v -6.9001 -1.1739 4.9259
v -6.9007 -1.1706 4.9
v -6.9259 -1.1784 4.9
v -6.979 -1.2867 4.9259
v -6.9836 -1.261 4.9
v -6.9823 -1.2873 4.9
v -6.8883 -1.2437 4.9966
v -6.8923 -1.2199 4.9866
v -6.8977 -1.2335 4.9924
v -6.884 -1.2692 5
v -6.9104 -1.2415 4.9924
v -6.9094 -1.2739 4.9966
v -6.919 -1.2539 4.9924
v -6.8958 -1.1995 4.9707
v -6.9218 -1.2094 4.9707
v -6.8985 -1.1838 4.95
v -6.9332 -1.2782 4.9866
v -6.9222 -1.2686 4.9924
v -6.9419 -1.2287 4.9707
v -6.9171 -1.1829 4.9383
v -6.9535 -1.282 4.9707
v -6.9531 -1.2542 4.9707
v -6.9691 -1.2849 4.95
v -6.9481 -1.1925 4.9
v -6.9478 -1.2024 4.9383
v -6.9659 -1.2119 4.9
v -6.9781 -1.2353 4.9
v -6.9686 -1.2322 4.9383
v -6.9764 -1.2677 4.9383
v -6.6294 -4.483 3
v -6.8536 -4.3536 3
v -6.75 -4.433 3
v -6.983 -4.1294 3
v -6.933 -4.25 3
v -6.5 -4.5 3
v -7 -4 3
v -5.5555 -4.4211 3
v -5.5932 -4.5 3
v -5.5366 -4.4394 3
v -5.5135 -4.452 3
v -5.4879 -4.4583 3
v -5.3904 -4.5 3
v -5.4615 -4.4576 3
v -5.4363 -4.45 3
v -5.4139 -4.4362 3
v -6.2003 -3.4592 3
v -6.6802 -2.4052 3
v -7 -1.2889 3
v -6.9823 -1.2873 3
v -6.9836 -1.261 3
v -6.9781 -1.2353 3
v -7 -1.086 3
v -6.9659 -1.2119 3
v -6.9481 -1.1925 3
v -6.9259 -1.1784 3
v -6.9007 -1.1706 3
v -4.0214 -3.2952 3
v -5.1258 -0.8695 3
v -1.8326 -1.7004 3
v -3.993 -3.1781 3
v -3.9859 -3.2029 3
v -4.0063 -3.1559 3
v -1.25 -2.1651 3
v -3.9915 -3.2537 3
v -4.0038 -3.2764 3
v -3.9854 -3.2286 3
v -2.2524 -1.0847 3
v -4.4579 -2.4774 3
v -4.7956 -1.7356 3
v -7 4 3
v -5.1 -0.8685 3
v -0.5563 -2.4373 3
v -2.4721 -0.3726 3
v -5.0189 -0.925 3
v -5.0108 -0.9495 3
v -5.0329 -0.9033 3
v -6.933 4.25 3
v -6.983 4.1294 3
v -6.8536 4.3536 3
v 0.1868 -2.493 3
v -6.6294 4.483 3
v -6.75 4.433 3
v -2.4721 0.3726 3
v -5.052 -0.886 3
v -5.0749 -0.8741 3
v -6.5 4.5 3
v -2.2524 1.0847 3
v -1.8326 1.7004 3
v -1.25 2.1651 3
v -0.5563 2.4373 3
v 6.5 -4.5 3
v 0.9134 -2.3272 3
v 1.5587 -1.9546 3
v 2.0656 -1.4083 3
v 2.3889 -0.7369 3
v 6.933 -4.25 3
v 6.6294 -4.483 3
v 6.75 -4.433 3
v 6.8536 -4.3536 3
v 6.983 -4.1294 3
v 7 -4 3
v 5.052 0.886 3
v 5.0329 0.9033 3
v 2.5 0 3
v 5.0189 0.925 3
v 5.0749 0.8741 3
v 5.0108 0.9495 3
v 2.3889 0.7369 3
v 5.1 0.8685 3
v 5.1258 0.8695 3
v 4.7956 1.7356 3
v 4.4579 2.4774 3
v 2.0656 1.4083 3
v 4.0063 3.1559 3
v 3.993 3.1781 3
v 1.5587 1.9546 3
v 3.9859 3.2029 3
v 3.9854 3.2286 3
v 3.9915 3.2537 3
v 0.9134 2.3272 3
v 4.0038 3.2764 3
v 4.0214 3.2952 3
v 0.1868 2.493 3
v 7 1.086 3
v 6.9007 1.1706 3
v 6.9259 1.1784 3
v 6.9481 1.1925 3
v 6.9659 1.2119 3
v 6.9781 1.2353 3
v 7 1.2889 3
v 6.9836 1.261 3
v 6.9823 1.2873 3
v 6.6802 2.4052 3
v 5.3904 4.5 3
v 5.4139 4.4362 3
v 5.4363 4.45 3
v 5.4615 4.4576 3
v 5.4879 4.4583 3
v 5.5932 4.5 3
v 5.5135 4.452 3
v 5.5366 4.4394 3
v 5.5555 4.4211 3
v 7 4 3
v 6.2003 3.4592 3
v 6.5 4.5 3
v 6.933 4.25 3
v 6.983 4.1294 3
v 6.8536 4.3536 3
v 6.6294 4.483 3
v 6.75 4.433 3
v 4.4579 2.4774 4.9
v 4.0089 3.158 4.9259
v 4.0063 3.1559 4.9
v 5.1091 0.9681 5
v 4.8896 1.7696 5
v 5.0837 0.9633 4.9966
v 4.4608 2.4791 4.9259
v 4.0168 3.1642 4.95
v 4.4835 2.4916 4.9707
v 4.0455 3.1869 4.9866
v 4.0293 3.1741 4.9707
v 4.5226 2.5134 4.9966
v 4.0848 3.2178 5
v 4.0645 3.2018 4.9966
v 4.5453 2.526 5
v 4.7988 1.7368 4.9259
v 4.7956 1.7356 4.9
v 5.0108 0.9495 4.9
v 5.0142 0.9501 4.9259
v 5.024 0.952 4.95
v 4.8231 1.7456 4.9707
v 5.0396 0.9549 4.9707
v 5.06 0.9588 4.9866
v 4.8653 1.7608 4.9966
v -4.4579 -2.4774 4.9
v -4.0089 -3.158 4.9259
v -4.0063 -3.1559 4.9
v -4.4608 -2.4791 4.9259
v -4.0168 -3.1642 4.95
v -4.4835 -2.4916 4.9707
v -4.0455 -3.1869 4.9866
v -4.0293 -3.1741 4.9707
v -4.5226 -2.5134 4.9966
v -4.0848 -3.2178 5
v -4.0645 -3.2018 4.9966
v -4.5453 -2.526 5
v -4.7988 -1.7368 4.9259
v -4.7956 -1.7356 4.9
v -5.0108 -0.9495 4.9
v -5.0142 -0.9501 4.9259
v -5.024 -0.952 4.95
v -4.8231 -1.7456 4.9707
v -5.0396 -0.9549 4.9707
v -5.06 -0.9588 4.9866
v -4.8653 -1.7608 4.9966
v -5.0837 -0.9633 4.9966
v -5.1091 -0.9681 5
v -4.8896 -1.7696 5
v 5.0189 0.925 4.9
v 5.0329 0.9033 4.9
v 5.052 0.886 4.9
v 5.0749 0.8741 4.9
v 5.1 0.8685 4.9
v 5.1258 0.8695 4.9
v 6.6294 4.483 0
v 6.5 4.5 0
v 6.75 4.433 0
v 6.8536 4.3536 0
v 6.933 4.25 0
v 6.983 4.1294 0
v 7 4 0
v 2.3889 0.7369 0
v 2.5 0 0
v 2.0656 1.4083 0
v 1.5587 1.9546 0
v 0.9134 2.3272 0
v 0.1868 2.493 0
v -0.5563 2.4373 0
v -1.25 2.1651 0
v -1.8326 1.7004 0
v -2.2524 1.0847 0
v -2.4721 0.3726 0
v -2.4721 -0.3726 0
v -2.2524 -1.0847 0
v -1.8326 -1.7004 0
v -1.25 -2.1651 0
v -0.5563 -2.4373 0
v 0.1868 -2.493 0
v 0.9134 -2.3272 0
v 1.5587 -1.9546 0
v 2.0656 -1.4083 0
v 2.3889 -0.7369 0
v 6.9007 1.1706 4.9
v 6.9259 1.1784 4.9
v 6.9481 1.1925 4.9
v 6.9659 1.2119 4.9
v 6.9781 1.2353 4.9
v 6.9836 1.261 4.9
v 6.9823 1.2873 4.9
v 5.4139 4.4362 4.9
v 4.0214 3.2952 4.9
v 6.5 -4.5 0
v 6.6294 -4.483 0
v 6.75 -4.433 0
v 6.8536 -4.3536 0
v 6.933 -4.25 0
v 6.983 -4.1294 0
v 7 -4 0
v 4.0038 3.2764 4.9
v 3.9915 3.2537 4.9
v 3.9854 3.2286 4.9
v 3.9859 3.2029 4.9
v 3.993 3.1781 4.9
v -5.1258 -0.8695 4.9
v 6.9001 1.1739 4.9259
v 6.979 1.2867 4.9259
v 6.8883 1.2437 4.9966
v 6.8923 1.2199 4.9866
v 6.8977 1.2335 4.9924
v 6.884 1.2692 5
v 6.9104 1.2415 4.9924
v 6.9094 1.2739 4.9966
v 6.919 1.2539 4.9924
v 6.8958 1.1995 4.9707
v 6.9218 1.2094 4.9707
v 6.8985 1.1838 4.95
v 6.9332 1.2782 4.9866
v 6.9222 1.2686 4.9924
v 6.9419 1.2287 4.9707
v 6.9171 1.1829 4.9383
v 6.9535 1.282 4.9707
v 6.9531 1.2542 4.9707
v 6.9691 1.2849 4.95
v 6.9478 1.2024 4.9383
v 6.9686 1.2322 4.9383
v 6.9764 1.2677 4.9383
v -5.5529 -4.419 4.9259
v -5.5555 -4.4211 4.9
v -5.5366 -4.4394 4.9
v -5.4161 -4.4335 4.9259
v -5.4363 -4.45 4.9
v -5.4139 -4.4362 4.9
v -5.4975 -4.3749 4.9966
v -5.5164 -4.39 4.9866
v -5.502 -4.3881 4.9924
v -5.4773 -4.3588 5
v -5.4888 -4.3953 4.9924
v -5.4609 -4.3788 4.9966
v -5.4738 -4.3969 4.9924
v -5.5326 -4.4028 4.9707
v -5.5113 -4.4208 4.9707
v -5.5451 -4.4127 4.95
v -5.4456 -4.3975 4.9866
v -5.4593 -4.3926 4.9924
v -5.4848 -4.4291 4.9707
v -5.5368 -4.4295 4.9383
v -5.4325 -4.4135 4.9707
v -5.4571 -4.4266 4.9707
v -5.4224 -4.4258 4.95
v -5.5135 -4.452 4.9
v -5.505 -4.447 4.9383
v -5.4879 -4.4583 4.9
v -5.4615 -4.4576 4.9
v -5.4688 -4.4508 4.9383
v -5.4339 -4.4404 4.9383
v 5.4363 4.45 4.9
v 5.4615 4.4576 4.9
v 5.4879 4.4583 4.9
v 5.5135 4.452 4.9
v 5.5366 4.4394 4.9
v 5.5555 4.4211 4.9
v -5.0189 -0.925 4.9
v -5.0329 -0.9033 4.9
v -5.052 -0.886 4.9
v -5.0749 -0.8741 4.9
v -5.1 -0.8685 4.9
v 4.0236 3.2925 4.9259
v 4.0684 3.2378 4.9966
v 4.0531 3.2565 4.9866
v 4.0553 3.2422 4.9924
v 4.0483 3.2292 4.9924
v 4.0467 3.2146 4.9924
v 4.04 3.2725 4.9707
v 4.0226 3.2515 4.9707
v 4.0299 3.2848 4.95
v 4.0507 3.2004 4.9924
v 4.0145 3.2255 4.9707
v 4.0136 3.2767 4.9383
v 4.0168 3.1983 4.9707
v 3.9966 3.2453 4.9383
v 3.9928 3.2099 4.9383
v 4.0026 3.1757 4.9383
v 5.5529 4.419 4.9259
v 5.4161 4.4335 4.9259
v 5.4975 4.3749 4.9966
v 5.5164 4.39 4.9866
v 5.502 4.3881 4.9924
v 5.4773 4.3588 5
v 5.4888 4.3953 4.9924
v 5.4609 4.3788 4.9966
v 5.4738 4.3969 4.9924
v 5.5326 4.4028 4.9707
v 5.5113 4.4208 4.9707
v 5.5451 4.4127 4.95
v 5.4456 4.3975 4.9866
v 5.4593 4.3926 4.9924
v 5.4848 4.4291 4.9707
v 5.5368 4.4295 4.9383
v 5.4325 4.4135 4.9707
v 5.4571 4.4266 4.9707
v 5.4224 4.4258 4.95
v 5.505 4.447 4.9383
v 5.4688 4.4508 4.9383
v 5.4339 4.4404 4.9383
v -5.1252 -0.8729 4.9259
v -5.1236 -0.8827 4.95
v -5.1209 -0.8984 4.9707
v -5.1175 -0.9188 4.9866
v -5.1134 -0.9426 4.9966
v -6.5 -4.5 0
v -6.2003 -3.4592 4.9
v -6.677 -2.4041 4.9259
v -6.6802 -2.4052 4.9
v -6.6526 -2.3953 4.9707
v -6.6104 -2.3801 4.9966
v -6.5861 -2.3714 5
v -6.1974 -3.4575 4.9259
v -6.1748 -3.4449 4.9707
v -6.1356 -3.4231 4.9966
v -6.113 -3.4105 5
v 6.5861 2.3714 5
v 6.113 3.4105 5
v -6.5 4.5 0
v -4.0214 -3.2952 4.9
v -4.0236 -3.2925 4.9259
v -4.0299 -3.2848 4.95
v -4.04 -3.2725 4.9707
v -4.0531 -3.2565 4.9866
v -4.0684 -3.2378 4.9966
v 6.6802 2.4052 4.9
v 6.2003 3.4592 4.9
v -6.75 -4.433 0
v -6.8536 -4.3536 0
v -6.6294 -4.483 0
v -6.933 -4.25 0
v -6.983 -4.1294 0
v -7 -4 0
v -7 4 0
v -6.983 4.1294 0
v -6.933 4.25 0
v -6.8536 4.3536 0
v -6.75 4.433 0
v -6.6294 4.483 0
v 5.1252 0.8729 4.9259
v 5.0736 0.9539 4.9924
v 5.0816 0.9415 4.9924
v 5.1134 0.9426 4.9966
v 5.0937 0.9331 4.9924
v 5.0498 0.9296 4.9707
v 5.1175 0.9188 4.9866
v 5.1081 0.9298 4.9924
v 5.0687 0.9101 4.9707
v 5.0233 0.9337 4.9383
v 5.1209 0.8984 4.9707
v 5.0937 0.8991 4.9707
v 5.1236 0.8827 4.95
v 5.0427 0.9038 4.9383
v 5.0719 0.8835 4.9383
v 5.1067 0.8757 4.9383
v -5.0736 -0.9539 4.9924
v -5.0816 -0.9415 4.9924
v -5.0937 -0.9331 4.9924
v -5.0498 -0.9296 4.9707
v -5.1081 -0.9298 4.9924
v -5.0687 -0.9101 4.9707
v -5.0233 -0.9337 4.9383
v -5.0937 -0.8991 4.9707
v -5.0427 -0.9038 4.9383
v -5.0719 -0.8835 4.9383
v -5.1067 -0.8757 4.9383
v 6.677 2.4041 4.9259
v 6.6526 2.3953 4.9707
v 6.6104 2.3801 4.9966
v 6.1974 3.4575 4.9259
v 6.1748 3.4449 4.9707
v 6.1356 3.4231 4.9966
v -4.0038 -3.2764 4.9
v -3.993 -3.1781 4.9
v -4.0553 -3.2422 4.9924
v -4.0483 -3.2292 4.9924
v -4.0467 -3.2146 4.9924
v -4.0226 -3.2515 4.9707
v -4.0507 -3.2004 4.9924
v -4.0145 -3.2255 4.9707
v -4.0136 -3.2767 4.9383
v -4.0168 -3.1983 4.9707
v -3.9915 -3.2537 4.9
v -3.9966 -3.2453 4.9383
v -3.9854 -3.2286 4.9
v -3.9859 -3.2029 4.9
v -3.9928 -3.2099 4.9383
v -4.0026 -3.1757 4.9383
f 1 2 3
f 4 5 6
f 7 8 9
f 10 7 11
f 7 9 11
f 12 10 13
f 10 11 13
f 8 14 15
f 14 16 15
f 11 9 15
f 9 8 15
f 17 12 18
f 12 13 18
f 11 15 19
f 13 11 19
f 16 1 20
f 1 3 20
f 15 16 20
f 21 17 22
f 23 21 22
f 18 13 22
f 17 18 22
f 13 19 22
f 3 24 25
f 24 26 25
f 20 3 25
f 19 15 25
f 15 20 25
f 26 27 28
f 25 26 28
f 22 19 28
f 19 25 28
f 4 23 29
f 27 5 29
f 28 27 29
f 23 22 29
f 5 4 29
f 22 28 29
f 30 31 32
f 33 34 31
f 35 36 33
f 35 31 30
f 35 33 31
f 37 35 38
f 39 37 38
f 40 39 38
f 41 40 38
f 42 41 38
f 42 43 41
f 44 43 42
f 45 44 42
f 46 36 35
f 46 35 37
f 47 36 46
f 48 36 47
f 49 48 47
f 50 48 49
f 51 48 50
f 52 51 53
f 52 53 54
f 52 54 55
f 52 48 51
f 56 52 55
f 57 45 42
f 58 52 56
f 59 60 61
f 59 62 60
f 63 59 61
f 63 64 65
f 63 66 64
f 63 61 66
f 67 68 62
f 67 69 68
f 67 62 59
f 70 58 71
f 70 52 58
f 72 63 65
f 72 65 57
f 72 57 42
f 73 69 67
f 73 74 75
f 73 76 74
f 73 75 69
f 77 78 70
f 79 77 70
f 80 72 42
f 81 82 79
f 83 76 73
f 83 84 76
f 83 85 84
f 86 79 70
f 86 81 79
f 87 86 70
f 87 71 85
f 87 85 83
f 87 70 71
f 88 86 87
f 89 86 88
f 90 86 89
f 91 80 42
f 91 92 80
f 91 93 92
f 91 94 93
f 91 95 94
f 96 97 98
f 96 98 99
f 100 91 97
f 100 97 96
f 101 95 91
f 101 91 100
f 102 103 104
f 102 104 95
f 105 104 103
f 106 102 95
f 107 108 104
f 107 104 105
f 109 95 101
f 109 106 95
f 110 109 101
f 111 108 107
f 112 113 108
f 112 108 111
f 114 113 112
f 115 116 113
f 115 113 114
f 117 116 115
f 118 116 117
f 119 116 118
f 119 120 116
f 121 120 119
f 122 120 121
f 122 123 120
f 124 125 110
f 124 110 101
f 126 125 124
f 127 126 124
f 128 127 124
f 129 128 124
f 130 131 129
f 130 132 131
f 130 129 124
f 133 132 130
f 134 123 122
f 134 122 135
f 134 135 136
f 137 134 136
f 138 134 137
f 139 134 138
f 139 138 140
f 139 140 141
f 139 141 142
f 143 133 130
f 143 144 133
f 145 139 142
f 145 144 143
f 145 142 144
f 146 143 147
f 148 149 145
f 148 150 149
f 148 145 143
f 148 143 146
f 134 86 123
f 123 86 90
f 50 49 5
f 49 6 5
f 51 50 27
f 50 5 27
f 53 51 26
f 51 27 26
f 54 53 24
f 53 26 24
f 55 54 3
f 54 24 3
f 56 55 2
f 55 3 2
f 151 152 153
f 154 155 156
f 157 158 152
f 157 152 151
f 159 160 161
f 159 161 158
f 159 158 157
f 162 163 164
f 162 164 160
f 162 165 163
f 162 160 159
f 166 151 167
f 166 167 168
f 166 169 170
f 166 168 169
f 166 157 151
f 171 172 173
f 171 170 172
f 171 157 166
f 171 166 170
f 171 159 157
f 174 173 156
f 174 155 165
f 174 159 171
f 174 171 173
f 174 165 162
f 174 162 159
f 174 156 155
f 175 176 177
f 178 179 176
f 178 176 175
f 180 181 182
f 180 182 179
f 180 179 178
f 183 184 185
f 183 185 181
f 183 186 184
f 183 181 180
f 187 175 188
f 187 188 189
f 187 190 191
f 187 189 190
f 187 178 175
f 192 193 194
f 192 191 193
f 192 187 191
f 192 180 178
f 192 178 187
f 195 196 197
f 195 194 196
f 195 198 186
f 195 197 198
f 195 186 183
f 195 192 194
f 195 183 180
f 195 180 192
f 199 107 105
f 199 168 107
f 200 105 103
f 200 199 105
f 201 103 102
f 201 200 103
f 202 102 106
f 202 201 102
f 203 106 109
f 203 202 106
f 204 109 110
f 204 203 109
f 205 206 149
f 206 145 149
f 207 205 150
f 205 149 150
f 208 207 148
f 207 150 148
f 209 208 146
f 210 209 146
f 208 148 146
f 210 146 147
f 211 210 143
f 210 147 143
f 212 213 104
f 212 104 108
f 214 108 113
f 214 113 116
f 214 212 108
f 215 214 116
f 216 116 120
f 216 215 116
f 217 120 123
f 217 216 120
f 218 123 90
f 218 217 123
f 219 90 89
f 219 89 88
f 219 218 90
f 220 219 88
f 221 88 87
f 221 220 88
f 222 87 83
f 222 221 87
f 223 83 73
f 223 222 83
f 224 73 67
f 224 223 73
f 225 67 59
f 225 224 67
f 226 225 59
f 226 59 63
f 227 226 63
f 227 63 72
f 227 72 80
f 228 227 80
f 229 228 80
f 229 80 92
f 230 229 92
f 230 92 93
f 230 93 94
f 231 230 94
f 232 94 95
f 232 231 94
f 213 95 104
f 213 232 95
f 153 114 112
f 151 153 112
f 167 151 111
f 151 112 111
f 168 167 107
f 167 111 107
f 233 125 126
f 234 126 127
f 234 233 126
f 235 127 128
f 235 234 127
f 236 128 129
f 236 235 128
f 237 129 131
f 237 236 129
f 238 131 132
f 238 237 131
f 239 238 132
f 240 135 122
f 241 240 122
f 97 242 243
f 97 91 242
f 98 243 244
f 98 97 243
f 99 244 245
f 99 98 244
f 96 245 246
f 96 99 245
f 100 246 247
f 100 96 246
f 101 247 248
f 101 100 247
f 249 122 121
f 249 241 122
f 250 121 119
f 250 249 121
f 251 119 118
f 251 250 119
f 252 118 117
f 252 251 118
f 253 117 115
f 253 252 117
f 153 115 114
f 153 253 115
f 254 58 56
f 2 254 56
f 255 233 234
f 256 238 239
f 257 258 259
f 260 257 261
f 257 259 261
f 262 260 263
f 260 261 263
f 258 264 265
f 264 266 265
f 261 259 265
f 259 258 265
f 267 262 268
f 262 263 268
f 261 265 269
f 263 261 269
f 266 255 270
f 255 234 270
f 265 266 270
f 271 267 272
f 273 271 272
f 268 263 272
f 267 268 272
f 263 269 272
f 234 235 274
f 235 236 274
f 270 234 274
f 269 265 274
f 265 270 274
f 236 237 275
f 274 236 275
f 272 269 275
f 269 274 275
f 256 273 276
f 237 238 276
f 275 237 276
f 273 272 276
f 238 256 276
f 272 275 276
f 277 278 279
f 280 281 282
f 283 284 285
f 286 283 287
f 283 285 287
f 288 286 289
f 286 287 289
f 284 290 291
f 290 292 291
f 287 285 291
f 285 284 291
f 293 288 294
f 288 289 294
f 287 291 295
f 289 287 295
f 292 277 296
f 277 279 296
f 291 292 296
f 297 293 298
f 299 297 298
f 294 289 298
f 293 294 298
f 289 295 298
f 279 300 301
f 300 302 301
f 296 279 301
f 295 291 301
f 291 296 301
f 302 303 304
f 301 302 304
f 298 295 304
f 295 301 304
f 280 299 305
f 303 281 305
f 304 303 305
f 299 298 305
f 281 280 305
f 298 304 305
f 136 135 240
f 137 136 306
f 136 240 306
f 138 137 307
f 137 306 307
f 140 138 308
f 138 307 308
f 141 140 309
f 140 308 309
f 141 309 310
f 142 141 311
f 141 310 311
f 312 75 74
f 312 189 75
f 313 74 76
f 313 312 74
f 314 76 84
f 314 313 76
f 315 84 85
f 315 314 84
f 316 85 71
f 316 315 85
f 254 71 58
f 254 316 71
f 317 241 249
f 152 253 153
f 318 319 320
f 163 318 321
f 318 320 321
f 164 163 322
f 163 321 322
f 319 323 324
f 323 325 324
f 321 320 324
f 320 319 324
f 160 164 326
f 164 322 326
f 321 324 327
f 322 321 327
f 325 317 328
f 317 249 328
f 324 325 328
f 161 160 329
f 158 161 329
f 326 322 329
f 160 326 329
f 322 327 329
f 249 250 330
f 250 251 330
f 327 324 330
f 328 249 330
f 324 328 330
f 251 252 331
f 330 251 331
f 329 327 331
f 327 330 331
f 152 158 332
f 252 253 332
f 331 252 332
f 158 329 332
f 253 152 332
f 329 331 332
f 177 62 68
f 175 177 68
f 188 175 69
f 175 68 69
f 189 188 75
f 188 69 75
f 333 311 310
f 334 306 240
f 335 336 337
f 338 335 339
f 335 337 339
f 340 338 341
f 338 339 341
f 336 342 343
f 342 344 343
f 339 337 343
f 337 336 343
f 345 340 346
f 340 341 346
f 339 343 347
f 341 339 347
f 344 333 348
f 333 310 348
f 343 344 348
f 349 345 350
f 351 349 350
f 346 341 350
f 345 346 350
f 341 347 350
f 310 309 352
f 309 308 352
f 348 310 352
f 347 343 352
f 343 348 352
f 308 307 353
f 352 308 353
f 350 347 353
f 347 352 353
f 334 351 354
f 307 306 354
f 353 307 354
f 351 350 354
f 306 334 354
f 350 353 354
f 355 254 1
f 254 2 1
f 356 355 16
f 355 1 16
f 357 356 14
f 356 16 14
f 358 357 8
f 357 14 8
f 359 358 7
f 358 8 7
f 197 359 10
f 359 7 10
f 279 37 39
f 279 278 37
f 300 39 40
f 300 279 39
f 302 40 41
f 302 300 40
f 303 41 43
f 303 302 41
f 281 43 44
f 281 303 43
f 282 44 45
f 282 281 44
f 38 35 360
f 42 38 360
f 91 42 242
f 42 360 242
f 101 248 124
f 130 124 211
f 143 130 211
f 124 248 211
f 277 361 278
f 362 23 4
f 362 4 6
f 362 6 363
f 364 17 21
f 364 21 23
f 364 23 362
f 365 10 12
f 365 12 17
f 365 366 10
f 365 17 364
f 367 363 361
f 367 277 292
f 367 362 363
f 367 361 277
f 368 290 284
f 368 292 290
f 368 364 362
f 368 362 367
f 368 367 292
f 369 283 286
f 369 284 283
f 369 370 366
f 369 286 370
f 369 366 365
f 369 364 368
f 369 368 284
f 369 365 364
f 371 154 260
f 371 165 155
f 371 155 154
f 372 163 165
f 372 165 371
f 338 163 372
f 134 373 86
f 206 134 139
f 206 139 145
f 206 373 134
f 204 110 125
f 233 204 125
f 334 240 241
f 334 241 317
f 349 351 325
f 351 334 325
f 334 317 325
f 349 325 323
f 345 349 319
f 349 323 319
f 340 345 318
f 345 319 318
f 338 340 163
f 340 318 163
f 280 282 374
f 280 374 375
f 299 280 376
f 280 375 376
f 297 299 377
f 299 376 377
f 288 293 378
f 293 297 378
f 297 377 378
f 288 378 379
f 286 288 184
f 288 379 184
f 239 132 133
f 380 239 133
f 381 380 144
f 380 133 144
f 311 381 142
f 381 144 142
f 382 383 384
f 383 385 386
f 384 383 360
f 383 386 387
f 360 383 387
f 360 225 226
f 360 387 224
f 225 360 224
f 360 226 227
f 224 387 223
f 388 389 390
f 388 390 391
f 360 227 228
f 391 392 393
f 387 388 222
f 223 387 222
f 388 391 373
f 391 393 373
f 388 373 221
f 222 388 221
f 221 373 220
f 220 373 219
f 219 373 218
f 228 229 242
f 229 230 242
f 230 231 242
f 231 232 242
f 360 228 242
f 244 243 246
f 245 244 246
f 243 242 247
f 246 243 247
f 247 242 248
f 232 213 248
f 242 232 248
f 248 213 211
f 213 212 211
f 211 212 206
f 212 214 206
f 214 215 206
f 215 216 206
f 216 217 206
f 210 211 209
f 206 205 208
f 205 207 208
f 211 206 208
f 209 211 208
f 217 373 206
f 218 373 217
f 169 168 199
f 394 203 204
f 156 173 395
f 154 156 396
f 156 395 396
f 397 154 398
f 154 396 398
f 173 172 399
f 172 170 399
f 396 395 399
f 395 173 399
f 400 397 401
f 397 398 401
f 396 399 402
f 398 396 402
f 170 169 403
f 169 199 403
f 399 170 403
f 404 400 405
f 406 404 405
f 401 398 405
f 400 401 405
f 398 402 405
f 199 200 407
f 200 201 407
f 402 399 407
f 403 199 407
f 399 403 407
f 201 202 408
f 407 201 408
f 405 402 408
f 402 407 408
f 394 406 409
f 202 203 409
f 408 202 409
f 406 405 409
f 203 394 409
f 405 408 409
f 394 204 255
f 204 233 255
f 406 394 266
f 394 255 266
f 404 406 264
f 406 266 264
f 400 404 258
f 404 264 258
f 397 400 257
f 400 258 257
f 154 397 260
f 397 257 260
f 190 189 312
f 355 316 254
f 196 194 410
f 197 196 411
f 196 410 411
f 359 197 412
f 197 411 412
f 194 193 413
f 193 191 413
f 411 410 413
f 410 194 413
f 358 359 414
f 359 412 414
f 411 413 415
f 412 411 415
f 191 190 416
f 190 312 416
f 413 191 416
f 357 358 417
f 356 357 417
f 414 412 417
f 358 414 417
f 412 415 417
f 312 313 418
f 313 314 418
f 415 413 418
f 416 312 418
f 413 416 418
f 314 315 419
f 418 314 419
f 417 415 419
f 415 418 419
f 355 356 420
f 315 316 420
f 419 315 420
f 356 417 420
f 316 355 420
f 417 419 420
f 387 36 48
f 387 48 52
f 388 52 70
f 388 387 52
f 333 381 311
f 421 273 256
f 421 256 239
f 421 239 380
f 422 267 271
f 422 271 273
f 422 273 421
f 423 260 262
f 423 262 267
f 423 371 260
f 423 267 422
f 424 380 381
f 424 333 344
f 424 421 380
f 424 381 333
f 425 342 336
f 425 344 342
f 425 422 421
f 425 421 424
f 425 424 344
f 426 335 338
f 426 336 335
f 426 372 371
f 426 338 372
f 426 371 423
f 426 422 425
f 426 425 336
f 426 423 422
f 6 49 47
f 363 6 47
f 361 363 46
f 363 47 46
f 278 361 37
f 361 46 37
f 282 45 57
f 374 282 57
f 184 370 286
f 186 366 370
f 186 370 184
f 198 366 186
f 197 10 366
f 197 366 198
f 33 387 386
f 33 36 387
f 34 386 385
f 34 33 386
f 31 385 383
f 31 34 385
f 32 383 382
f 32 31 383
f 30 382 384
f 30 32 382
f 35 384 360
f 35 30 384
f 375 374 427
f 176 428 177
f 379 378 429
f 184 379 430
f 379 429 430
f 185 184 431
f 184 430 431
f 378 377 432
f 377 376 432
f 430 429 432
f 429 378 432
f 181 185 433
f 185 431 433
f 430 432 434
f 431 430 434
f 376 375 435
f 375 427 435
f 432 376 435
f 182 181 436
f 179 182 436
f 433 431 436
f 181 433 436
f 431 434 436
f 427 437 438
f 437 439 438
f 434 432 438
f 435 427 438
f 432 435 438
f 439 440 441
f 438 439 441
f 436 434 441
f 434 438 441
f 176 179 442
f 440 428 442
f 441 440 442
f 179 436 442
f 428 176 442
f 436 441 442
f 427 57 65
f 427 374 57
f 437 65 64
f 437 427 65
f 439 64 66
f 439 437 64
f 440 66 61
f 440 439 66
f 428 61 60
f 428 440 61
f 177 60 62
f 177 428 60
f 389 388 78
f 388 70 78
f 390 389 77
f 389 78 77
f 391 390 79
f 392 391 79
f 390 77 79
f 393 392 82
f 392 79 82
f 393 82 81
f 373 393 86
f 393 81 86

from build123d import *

# Parameters (mm, degrees)
SKETCH1_W           = 14
SKETCH1_H           = 9
SKETCH1_R           = 2.5
BOSS_EXTRUDE1_DEPTH = 3
FILLET1_R           = 0.5
BOSS_EXTRUDE2_DEPTH = 2
FILLET2_R           = 0.1


with BuildPart() as part:
    # Sketch1 → Boss-Extrude1 (new body)
    with BuildSketch(Plane.XY):
        Rectangle(SKETCH1_W, SKETCH1_H)
        Circle(SKETCH1_R, mode=Mode.SUBTRACT)
    extrude(amount=BOSS_EXTRUDE1_DEPTH)

    # Fillet1
    fillet1_edges = [part.edges().sort_by_distance(p)[0] for p in [
        (-7, 4.5, 1.5),
        (7, 4.5, 1.5),
        (7, -4.5, 1.5),
        (-7, -4.5, 1.5),
    ]]
    fillet(fillet1_edges, radius=FILLET1_R)

    # Sketch2 → Boss-Extrude2 (add)
    with BuildSketch(Plane.XY.offset(3)):
        with BuildLine():
            Line((-5.028169014, -0.852945699), (-7, -1.187434209))
            ThreePointArc((-7, -1.187434209), (-6.461781127, -2.942003512), (-5.491812087, -4.5))
            Line((-5.491812087, -4.5), (-3.944822767, -3.232394366))
            ThreePointArc((-3.944822767, -3.232394366), (-4.641561091, -2.113270128), (-5.028169014, -0.852945699))
        make_face()
        with BuildLine():
            Line((5.491812087, 4.5), (3.944822767, 3.232394366))
            ThreePointArc((3.944822767, 3.232394366), (4.641561091, 2.113270128), (5.028169014, 0.852945699))
            Line((5.028169014, 0.852945699), (7, 1.187434209))
            ThreePointArc((7, 1.187434209), (6.461781127, 2.942003512), (5.491812087, 4.5))
        make_face()
    extrude(amount=BOSS_EXTRUDE2_DEPTH)

    # Fillet2
    fillet2_edges = [part.edges().sort_by_distance(p)[0] for p in [
        (-5.028169014, -0.852945699, 4),
        (-7, -1.187434209, 4),
        (-5.491812087, -4.5, 4),
        (-4.641561091, -2.113270128, 5),
        (-3.944822767, -3.232394366, 4),
        (-6.014084507, -1.020189954, 5),
        (-6.461781127, -2.942003512, 5),
        (-4.718317427, -3.866197183, 5),
        (5.491812087, 4.5, 4),
        (3.944822767, 3.232394366, 4),
        (6.014084507, 1.020189954, 5),
        (5.028169014, 0.852945699, 4),
        (6.461781127, 2.942003512, 5),
        (7, 1.187434209, 4),
        (4.718317427, 3.866197183, 5),
        (4.641561091, 2.113270128, 5),
    ]]
    fillet(fillet2_edges, radius=FILLET2_R)


solid = part.part
